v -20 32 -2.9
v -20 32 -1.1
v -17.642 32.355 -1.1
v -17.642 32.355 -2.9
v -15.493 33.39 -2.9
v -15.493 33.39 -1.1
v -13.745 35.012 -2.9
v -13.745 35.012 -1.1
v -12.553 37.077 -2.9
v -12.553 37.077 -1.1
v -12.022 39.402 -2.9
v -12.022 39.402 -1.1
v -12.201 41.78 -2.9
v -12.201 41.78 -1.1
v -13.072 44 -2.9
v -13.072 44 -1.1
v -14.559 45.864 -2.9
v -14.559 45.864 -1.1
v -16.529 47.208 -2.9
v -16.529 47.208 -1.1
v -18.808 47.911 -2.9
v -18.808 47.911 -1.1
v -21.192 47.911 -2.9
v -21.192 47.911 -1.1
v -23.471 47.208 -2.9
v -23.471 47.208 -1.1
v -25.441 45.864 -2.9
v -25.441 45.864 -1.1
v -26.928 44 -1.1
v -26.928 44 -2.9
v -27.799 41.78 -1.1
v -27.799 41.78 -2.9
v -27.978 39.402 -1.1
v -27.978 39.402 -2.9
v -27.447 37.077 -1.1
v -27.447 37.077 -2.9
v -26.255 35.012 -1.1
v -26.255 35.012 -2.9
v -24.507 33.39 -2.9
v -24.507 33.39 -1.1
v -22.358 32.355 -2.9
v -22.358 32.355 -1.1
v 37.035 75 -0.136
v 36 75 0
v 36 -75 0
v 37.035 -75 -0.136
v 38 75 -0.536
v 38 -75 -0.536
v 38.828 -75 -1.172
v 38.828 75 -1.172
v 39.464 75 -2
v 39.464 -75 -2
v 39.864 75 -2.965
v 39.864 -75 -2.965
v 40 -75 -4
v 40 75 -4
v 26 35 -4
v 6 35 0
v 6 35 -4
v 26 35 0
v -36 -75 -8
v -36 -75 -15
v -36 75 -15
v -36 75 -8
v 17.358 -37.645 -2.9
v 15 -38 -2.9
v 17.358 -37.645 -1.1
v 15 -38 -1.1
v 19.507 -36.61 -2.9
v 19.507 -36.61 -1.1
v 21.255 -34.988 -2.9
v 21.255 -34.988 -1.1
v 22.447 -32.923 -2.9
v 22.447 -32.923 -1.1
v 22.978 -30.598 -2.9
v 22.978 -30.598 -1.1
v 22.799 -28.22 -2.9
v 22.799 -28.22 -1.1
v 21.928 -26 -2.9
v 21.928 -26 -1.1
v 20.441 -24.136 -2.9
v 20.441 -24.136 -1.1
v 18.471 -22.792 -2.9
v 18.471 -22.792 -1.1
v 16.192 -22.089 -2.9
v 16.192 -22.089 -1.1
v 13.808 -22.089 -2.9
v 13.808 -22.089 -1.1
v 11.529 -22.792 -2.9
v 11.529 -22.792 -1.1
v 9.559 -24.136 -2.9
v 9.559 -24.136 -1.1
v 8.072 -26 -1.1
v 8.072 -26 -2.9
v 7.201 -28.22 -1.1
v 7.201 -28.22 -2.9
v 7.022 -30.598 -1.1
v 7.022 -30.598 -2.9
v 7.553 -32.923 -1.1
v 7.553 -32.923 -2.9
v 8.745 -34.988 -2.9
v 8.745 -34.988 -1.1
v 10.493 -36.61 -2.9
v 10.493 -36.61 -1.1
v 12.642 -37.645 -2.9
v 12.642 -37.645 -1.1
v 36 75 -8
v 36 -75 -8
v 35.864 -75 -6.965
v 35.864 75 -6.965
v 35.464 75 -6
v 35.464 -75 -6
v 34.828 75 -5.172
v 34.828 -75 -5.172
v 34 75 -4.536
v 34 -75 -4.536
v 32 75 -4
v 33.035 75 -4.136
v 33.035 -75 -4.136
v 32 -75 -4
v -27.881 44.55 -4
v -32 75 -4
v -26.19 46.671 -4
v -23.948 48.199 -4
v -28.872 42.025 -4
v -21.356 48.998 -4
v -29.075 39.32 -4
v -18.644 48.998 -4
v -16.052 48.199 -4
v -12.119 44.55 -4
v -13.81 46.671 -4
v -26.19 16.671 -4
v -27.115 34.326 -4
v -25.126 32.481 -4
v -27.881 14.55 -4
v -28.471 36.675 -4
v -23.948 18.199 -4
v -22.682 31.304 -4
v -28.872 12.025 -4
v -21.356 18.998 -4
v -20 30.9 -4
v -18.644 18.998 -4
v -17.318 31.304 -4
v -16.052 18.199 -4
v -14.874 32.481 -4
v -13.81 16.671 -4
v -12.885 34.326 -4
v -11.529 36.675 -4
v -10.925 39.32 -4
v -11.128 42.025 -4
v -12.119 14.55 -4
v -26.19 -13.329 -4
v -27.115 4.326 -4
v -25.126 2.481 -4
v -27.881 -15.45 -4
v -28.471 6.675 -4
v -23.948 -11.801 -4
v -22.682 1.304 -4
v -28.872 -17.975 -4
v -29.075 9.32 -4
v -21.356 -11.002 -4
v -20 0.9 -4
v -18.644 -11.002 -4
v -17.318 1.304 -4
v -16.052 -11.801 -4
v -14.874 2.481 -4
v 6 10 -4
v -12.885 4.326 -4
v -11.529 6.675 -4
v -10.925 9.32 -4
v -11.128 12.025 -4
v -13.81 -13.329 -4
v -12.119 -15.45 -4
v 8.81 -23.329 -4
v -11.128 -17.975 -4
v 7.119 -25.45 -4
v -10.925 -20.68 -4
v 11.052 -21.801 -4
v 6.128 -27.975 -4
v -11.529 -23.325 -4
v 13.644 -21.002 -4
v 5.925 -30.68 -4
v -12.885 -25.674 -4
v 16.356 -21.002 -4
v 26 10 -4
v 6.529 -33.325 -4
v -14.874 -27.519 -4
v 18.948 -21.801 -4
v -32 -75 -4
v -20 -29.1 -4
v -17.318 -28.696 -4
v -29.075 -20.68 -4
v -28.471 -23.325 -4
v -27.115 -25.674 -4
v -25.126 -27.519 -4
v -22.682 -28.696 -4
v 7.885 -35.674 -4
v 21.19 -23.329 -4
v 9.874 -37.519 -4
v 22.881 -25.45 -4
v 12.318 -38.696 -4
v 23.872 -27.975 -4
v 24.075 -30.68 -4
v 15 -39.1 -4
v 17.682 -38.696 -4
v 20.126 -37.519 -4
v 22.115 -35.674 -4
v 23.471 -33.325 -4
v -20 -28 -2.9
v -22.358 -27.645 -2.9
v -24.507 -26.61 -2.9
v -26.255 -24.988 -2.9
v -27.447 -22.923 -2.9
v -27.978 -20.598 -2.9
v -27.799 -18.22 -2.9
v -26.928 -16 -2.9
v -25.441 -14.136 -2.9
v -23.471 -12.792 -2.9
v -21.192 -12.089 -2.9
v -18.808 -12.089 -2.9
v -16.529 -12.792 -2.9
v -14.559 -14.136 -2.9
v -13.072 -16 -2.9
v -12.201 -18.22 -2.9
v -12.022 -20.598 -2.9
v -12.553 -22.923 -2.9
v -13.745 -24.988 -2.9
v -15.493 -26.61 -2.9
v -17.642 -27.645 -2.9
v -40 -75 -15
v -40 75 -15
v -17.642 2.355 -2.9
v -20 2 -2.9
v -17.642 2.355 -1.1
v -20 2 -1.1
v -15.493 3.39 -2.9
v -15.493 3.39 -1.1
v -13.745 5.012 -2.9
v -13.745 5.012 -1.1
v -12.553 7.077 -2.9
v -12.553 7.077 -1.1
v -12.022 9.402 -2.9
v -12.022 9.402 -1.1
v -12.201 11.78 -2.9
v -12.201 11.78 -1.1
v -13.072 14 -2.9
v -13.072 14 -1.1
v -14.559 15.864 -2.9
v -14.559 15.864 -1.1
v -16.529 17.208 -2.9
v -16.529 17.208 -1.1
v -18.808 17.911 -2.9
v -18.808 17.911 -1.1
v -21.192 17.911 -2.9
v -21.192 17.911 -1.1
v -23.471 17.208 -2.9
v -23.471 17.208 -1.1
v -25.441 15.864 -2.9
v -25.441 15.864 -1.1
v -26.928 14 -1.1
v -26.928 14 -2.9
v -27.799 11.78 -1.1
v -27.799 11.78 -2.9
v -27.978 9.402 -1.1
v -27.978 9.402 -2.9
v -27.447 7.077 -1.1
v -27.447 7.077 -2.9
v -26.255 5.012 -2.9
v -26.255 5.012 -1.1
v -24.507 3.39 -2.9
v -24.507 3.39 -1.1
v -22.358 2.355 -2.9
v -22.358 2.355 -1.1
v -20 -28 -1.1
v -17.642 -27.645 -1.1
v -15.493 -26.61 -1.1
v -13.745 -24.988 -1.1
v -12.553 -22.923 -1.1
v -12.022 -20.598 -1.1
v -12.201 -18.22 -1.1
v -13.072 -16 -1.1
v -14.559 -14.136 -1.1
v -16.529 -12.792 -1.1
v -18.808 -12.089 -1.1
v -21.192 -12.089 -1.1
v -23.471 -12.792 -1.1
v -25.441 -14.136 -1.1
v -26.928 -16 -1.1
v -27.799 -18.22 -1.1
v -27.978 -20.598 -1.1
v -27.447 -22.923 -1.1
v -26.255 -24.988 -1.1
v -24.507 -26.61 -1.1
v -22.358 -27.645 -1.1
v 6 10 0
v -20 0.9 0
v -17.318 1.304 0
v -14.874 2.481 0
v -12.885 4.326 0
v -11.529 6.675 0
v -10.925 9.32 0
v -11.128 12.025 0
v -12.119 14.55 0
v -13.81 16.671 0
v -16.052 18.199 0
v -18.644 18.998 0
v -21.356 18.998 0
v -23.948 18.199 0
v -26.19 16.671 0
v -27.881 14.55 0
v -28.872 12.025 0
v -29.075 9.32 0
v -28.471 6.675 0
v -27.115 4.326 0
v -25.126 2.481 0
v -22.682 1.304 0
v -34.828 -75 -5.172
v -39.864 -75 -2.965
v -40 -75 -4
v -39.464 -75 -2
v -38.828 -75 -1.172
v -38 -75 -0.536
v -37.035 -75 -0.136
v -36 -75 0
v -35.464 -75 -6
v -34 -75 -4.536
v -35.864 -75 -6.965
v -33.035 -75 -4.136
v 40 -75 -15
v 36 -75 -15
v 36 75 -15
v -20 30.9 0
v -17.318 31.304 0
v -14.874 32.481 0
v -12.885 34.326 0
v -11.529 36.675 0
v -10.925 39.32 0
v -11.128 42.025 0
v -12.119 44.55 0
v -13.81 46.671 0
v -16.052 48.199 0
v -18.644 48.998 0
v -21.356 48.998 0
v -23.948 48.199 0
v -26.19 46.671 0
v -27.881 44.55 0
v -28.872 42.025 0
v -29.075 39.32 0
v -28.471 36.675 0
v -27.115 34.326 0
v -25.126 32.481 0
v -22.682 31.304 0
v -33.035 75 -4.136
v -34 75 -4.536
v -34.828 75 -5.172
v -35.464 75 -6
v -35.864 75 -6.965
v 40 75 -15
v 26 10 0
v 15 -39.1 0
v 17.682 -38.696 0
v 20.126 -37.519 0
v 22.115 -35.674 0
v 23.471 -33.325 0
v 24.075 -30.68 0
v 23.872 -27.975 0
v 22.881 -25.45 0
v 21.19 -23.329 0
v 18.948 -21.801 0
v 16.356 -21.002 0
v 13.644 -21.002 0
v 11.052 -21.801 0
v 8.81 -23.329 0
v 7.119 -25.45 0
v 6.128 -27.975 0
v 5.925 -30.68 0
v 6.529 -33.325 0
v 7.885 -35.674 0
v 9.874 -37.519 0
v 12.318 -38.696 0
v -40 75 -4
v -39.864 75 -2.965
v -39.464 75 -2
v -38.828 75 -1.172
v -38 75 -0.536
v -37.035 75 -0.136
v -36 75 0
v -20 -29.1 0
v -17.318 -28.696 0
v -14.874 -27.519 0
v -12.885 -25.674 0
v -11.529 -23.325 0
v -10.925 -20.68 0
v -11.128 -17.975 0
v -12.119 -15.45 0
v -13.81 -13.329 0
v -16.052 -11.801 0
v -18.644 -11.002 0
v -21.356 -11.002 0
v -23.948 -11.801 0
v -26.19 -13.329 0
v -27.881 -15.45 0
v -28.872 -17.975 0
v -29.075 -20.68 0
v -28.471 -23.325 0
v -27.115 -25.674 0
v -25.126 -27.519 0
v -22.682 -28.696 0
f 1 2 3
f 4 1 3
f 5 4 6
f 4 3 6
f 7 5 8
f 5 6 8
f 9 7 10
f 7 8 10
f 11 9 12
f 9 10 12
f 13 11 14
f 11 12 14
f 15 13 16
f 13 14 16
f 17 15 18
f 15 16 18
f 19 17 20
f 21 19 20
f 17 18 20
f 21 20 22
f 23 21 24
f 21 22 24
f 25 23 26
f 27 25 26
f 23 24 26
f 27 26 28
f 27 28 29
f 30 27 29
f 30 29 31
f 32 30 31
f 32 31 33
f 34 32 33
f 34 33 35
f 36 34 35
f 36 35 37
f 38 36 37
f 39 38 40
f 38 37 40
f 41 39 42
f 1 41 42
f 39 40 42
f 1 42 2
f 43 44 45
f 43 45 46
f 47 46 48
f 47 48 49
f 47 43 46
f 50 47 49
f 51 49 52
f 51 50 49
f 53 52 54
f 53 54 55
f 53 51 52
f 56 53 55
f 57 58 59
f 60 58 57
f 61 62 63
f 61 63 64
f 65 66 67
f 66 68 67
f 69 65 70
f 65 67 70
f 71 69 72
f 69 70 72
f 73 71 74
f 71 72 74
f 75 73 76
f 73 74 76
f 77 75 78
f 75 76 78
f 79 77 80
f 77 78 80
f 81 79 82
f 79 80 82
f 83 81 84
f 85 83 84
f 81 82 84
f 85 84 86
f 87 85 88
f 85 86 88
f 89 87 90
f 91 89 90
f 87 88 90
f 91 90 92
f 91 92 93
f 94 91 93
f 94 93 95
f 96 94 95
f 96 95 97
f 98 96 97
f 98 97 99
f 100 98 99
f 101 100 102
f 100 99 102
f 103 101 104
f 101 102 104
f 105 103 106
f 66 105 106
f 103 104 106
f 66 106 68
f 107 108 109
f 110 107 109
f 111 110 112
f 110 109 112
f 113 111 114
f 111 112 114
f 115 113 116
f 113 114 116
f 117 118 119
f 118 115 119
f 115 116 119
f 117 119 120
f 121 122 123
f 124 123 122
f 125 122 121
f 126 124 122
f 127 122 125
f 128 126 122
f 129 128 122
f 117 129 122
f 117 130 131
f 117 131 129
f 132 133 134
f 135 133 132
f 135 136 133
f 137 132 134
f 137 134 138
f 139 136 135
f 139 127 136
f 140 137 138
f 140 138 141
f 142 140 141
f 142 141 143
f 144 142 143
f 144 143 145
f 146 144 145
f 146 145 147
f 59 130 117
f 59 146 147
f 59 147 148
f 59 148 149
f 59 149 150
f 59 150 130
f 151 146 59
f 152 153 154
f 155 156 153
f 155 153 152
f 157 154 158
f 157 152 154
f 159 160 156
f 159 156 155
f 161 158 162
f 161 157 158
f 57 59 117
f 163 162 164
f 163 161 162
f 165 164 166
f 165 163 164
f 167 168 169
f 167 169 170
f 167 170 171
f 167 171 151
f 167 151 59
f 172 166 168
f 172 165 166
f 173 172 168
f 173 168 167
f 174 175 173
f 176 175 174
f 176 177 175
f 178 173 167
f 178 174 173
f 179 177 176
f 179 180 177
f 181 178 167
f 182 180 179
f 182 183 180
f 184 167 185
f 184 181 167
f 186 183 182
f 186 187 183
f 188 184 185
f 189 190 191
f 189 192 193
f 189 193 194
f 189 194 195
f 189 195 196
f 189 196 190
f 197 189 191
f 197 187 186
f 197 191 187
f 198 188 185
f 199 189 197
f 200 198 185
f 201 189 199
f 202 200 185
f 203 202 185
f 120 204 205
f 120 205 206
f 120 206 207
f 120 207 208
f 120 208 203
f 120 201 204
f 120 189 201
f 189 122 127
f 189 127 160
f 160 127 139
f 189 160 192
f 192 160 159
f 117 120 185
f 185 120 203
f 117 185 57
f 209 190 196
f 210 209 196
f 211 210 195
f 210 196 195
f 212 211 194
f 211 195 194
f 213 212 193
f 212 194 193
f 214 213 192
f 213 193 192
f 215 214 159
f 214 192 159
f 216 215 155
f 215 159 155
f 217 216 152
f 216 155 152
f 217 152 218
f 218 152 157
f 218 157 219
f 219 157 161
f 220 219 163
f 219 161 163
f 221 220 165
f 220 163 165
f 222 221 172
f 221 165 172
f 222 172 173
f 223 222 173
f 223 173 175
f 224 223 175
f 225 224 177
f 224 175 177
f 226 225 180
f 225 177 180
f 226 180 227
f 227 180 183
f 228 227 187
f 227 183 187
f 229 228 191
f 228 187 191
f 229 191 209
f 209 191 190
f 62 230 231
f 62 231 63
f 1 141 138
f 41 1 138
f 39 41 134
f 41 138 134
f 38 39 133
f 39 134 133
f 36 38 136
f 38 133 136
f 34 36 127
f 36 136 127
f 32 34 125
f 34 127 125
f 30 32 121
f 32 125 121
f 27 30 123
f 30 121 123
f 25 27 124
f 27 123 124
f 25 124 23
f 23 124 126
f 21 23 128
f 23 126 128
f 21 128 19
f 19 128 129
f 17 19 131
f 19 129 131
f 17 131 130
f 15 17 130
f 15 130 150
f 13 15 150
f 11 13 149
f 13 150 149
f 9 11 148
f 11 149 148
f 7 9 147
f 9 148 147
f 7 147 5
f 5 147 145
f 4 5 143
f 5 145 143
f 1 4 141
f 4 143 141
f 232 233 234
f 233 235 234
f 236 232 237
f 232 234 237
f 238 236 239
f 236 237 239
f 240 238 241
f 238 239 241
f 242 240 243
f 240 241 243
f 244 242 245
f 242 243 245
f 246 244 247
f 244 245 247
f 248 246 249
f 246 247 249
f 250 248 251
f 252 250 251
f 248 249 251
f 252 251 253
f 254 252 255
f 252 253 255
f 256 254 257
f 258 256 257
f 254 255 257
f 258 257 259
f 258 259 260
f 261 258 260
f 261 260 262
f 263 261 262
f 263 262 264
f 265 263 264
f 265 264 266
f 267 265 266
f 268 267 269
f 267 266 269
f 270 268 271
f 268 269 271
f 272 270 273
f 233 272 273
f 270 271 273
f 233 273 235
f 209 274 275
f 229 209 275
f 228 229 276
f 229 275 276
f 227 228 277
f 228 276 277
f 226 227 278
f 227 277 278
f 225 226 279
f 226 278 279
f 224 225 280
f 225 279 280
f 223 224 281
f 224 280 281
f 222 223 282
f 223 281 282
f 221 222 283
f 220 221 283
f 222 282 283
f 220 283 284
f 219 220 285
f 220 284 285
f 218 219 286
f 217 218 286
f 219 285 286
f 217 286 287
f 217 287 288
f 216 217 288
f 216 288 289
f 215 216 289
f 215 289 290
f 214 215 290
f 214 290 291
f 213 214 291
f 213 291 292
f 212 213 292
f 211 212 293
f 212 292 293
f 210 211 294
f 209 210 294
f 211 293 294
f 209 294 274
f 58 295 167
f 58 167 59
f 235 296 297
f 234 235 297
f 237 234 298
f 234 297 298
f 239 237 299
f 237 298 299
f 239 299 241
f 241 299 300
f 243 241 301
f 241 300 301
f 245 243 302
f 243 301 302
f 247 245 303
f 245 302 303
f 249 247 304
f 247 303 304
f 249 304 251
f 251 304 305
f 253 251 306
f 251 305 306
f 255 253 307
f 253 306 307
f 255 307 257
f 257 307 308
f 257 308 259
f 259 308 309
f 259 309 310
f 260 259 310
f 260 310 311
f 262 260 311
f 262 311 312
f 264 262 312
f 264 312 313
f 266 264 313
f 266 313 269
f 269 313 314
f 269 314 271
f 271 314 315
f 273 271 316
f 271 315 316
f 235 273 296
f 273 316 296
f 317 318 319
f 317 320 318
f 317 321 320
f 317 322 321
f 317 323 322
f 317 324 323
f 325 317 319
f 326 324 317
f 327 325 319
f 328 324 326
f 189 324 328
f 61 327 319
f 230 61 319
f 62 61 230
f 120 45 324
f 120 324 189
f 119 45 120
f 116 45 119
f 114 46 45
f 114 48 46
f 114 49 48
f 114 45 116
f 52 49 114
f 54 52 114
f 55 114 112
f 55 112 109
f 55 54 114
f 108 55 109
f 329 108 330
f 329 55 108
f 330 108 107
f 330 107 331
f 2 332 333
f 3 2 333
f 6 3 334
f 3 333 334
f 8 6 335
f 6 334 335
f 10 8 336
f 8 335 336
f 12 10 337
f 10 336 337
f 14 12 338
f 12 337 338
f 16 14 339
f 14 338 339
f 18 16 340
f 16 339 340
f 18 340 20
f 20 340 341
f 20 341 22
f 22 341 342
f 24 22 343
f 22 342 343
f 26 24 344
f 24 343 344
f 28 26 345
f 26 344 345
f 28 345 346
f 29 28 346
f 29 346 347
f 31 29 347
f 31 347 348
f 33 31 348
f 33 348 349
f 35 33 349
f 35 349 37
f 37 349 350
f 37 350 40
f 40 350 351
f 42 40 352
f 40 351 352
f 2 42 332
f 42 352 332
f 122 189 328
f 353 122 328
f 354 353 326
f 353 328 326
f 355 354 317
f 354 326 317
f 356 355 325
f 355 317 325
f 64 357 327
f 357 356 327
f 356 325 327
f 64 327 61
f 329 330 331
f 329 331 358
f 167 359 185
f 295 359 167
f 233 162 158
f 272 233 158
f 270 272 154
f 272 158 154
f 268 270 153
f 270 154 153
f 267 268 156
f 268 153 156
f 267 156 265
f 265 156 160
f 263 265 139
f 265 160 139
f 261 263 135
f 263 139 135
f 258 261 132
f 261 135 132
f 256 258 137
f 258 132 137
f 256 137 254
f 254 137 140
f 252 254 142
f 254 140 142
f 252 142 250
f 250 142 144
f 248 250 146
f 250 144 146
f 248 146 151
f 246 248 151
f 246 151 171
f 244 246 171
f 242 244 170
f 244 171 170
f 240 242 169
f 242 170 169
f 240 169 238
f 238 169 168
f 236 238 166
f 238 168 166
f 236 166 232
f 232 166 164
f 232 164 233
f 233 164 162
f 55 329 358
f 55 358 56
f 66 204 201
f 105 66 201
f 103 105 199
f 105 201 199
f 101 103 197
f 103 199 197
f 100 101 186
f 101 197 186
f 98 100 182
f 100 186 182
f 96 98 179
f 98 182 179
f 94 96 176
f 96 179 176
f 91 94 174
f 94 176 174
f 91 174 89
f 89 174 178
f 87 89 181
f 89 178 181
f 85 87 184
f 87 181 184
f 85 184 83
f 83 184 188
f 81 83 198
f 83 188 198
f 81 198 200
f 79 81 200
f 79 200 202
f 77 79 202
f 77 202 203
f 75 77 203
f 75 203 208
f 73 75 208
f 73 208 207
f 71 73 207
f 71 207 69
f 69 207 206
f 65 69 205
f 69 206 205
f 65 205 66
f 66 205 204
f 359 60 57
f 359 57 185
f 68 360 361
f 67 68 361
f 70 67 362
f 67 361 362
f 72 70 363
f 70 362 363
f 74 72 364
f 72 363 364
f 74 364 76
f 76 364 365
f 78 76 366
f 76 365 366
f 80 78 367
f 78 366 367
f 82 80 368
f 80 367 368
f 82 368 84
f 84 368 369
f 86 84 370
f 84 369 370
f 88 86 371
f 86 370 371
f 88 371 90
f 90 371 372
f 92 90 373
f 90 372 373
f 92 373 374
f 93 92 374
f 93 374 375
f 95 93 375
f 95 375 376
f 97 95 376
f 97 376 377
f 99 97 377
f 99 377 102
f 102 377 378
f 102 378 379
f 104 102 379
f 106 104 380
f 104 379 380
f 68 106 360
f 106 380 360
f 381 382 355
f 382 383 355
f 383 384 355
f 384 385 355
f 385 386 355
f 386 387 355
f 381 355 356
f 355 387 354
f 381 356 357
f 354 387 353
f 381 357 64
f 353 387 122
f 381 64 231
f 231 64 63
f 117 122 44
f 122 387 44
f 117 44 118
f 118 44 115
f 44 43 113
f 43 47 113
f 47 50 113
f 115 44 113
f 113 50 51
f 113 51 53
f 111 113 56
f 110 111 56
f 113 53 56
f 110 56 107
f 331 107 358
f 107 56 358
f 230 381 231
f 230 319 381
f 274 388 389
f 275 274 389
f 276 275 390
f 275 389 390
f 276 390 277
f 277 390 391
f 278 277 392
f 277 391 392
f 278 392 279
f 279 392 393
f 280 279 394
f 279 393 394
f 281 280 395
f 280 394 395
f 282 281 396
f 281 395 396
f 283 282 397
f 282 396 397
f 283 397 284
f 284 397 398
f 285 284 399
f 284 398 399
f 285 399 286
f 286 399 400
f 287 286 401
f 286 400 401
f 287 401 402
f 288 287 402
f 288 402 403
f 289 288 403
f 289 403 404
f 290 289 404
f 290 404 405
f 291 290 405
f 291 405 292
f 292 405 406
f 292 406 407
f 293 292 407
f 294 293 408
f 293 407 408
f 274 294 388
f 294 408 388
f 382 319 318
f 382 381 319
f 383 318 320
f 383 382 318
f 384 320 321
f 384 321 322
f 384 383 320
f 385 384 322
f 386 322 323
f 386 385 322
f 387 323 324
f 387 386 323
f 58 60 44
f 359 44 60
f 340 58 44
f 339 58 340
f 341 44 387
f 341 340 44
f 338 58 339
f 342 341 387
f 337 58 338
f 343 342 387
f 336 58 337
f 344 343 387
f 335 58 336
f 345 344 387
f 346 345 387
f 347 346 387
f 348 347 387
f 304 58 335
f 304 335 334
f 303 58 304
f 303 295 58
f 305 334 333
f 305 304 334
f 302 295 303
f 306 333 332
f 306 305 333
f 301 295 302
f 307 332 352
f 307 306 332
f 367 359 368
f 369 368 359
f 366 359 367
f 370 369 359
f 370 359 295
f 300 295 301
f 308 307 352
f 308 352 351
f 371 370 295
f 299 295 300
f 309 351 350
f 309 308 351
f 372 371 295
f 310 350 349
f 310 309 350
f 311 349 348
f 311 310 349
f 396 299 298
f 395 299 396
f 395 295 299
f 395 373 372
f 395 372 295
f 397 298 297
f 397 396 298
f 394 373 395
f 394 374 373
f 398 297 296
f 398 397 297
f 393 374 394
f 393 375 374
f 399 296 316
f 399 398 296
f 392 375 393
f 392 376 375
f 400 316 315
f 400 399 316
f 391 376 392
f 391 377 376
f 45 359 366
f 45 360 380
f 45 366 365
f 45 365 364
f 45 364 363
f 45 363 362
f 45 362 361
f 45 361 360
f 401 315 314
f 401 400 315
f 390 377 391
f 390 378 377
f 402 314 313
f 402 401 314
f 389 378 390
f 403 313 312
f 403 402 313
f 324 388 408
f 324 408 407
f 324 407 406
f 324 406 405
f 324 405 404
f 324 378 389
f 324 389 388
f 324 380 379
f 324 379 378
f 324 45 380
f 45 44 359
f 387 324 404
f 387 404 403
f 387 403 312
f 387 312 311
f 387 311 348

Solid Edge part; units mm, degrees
sketch "Sketch1" plane through (0, 0, 0) normal (0, -1, 0) x (1, 0, 0)
  line L0 (-40, -15) -> (-36, -15)
  line L1 (-36, -15) -> (-36, -4)
  line L2 (-36, -4) -> (36, -4)
  line L3 (36, -4) -> (36, -15)
  line L4 (36, -15) -> (40, -15)
  line L5 (40, -15) -> (40, 0)
  line L6 (40, 0) -> (-40, 0)
  line L7 (-40, 0) -> (-40, -15)
  dimension "D1" = 80
  dimension "D2" = 4
  dimension "D3" = 15
  dimension "D4" = 4
extrude "v_1_body" add sketch "Sketch1" against normal blind 75 and the other way blind 75
fillet "v_1_side_rounds" radius 4 4 edges at (36, 0, -4) (-36, 0, -4) (40, 0, 0) (-40, 0, 0)
hole "Hole1" at (-20, 40, 0) direction (0, 0, -1) diameter 16 end up to next start chamfer 1.1 start chamfer angle 45 end chamfer 1.1 end chamfer angle 45
hole "Hole2" at (-20, 10, 0) direction (0, 0, -1) diameter 16 end up to next start chamfer 1.1 start chamfer angle 45 end chamfer 1.1 end chamfer angle 45
hole "Hole3" at (-20, -20, 0) direction (0, 0, -1) diameter 16 end up to next start chamfer 1.1 start chamfer angle 45 end chamfer 1.1 end chamfer angle 45
hole "Hole4" at (15, -30, 0) direction (0, 0, -1) diameter 16 end up to next start chamfer 1.1 start chamfer angle 45 end chamfer 1.1 end chamfer angle 45
sketch "Sketch2" plane through (0, 0, 0) normal (0, 0, 1) x (1, 0, 0)
  line L0 (6, 35) -> (26, 35)
  line L1 (26, 35) -> (26, 10)
  line L2 (26, 10) -> (6, 10)
  line L3 (6, 10) -> (6, 35)
extrude "Cutout1" cut sketch "Sketch2" against normal up to next
extrude "v_1_ult_cap_bearing_bodies" [suppressed]
fillet "v_1_ult_cap_bearing_counds" [suppressed]
hole "v_1_ult_cap_hole" [suppressed]
properties material "Polypropylene, general purpose"
